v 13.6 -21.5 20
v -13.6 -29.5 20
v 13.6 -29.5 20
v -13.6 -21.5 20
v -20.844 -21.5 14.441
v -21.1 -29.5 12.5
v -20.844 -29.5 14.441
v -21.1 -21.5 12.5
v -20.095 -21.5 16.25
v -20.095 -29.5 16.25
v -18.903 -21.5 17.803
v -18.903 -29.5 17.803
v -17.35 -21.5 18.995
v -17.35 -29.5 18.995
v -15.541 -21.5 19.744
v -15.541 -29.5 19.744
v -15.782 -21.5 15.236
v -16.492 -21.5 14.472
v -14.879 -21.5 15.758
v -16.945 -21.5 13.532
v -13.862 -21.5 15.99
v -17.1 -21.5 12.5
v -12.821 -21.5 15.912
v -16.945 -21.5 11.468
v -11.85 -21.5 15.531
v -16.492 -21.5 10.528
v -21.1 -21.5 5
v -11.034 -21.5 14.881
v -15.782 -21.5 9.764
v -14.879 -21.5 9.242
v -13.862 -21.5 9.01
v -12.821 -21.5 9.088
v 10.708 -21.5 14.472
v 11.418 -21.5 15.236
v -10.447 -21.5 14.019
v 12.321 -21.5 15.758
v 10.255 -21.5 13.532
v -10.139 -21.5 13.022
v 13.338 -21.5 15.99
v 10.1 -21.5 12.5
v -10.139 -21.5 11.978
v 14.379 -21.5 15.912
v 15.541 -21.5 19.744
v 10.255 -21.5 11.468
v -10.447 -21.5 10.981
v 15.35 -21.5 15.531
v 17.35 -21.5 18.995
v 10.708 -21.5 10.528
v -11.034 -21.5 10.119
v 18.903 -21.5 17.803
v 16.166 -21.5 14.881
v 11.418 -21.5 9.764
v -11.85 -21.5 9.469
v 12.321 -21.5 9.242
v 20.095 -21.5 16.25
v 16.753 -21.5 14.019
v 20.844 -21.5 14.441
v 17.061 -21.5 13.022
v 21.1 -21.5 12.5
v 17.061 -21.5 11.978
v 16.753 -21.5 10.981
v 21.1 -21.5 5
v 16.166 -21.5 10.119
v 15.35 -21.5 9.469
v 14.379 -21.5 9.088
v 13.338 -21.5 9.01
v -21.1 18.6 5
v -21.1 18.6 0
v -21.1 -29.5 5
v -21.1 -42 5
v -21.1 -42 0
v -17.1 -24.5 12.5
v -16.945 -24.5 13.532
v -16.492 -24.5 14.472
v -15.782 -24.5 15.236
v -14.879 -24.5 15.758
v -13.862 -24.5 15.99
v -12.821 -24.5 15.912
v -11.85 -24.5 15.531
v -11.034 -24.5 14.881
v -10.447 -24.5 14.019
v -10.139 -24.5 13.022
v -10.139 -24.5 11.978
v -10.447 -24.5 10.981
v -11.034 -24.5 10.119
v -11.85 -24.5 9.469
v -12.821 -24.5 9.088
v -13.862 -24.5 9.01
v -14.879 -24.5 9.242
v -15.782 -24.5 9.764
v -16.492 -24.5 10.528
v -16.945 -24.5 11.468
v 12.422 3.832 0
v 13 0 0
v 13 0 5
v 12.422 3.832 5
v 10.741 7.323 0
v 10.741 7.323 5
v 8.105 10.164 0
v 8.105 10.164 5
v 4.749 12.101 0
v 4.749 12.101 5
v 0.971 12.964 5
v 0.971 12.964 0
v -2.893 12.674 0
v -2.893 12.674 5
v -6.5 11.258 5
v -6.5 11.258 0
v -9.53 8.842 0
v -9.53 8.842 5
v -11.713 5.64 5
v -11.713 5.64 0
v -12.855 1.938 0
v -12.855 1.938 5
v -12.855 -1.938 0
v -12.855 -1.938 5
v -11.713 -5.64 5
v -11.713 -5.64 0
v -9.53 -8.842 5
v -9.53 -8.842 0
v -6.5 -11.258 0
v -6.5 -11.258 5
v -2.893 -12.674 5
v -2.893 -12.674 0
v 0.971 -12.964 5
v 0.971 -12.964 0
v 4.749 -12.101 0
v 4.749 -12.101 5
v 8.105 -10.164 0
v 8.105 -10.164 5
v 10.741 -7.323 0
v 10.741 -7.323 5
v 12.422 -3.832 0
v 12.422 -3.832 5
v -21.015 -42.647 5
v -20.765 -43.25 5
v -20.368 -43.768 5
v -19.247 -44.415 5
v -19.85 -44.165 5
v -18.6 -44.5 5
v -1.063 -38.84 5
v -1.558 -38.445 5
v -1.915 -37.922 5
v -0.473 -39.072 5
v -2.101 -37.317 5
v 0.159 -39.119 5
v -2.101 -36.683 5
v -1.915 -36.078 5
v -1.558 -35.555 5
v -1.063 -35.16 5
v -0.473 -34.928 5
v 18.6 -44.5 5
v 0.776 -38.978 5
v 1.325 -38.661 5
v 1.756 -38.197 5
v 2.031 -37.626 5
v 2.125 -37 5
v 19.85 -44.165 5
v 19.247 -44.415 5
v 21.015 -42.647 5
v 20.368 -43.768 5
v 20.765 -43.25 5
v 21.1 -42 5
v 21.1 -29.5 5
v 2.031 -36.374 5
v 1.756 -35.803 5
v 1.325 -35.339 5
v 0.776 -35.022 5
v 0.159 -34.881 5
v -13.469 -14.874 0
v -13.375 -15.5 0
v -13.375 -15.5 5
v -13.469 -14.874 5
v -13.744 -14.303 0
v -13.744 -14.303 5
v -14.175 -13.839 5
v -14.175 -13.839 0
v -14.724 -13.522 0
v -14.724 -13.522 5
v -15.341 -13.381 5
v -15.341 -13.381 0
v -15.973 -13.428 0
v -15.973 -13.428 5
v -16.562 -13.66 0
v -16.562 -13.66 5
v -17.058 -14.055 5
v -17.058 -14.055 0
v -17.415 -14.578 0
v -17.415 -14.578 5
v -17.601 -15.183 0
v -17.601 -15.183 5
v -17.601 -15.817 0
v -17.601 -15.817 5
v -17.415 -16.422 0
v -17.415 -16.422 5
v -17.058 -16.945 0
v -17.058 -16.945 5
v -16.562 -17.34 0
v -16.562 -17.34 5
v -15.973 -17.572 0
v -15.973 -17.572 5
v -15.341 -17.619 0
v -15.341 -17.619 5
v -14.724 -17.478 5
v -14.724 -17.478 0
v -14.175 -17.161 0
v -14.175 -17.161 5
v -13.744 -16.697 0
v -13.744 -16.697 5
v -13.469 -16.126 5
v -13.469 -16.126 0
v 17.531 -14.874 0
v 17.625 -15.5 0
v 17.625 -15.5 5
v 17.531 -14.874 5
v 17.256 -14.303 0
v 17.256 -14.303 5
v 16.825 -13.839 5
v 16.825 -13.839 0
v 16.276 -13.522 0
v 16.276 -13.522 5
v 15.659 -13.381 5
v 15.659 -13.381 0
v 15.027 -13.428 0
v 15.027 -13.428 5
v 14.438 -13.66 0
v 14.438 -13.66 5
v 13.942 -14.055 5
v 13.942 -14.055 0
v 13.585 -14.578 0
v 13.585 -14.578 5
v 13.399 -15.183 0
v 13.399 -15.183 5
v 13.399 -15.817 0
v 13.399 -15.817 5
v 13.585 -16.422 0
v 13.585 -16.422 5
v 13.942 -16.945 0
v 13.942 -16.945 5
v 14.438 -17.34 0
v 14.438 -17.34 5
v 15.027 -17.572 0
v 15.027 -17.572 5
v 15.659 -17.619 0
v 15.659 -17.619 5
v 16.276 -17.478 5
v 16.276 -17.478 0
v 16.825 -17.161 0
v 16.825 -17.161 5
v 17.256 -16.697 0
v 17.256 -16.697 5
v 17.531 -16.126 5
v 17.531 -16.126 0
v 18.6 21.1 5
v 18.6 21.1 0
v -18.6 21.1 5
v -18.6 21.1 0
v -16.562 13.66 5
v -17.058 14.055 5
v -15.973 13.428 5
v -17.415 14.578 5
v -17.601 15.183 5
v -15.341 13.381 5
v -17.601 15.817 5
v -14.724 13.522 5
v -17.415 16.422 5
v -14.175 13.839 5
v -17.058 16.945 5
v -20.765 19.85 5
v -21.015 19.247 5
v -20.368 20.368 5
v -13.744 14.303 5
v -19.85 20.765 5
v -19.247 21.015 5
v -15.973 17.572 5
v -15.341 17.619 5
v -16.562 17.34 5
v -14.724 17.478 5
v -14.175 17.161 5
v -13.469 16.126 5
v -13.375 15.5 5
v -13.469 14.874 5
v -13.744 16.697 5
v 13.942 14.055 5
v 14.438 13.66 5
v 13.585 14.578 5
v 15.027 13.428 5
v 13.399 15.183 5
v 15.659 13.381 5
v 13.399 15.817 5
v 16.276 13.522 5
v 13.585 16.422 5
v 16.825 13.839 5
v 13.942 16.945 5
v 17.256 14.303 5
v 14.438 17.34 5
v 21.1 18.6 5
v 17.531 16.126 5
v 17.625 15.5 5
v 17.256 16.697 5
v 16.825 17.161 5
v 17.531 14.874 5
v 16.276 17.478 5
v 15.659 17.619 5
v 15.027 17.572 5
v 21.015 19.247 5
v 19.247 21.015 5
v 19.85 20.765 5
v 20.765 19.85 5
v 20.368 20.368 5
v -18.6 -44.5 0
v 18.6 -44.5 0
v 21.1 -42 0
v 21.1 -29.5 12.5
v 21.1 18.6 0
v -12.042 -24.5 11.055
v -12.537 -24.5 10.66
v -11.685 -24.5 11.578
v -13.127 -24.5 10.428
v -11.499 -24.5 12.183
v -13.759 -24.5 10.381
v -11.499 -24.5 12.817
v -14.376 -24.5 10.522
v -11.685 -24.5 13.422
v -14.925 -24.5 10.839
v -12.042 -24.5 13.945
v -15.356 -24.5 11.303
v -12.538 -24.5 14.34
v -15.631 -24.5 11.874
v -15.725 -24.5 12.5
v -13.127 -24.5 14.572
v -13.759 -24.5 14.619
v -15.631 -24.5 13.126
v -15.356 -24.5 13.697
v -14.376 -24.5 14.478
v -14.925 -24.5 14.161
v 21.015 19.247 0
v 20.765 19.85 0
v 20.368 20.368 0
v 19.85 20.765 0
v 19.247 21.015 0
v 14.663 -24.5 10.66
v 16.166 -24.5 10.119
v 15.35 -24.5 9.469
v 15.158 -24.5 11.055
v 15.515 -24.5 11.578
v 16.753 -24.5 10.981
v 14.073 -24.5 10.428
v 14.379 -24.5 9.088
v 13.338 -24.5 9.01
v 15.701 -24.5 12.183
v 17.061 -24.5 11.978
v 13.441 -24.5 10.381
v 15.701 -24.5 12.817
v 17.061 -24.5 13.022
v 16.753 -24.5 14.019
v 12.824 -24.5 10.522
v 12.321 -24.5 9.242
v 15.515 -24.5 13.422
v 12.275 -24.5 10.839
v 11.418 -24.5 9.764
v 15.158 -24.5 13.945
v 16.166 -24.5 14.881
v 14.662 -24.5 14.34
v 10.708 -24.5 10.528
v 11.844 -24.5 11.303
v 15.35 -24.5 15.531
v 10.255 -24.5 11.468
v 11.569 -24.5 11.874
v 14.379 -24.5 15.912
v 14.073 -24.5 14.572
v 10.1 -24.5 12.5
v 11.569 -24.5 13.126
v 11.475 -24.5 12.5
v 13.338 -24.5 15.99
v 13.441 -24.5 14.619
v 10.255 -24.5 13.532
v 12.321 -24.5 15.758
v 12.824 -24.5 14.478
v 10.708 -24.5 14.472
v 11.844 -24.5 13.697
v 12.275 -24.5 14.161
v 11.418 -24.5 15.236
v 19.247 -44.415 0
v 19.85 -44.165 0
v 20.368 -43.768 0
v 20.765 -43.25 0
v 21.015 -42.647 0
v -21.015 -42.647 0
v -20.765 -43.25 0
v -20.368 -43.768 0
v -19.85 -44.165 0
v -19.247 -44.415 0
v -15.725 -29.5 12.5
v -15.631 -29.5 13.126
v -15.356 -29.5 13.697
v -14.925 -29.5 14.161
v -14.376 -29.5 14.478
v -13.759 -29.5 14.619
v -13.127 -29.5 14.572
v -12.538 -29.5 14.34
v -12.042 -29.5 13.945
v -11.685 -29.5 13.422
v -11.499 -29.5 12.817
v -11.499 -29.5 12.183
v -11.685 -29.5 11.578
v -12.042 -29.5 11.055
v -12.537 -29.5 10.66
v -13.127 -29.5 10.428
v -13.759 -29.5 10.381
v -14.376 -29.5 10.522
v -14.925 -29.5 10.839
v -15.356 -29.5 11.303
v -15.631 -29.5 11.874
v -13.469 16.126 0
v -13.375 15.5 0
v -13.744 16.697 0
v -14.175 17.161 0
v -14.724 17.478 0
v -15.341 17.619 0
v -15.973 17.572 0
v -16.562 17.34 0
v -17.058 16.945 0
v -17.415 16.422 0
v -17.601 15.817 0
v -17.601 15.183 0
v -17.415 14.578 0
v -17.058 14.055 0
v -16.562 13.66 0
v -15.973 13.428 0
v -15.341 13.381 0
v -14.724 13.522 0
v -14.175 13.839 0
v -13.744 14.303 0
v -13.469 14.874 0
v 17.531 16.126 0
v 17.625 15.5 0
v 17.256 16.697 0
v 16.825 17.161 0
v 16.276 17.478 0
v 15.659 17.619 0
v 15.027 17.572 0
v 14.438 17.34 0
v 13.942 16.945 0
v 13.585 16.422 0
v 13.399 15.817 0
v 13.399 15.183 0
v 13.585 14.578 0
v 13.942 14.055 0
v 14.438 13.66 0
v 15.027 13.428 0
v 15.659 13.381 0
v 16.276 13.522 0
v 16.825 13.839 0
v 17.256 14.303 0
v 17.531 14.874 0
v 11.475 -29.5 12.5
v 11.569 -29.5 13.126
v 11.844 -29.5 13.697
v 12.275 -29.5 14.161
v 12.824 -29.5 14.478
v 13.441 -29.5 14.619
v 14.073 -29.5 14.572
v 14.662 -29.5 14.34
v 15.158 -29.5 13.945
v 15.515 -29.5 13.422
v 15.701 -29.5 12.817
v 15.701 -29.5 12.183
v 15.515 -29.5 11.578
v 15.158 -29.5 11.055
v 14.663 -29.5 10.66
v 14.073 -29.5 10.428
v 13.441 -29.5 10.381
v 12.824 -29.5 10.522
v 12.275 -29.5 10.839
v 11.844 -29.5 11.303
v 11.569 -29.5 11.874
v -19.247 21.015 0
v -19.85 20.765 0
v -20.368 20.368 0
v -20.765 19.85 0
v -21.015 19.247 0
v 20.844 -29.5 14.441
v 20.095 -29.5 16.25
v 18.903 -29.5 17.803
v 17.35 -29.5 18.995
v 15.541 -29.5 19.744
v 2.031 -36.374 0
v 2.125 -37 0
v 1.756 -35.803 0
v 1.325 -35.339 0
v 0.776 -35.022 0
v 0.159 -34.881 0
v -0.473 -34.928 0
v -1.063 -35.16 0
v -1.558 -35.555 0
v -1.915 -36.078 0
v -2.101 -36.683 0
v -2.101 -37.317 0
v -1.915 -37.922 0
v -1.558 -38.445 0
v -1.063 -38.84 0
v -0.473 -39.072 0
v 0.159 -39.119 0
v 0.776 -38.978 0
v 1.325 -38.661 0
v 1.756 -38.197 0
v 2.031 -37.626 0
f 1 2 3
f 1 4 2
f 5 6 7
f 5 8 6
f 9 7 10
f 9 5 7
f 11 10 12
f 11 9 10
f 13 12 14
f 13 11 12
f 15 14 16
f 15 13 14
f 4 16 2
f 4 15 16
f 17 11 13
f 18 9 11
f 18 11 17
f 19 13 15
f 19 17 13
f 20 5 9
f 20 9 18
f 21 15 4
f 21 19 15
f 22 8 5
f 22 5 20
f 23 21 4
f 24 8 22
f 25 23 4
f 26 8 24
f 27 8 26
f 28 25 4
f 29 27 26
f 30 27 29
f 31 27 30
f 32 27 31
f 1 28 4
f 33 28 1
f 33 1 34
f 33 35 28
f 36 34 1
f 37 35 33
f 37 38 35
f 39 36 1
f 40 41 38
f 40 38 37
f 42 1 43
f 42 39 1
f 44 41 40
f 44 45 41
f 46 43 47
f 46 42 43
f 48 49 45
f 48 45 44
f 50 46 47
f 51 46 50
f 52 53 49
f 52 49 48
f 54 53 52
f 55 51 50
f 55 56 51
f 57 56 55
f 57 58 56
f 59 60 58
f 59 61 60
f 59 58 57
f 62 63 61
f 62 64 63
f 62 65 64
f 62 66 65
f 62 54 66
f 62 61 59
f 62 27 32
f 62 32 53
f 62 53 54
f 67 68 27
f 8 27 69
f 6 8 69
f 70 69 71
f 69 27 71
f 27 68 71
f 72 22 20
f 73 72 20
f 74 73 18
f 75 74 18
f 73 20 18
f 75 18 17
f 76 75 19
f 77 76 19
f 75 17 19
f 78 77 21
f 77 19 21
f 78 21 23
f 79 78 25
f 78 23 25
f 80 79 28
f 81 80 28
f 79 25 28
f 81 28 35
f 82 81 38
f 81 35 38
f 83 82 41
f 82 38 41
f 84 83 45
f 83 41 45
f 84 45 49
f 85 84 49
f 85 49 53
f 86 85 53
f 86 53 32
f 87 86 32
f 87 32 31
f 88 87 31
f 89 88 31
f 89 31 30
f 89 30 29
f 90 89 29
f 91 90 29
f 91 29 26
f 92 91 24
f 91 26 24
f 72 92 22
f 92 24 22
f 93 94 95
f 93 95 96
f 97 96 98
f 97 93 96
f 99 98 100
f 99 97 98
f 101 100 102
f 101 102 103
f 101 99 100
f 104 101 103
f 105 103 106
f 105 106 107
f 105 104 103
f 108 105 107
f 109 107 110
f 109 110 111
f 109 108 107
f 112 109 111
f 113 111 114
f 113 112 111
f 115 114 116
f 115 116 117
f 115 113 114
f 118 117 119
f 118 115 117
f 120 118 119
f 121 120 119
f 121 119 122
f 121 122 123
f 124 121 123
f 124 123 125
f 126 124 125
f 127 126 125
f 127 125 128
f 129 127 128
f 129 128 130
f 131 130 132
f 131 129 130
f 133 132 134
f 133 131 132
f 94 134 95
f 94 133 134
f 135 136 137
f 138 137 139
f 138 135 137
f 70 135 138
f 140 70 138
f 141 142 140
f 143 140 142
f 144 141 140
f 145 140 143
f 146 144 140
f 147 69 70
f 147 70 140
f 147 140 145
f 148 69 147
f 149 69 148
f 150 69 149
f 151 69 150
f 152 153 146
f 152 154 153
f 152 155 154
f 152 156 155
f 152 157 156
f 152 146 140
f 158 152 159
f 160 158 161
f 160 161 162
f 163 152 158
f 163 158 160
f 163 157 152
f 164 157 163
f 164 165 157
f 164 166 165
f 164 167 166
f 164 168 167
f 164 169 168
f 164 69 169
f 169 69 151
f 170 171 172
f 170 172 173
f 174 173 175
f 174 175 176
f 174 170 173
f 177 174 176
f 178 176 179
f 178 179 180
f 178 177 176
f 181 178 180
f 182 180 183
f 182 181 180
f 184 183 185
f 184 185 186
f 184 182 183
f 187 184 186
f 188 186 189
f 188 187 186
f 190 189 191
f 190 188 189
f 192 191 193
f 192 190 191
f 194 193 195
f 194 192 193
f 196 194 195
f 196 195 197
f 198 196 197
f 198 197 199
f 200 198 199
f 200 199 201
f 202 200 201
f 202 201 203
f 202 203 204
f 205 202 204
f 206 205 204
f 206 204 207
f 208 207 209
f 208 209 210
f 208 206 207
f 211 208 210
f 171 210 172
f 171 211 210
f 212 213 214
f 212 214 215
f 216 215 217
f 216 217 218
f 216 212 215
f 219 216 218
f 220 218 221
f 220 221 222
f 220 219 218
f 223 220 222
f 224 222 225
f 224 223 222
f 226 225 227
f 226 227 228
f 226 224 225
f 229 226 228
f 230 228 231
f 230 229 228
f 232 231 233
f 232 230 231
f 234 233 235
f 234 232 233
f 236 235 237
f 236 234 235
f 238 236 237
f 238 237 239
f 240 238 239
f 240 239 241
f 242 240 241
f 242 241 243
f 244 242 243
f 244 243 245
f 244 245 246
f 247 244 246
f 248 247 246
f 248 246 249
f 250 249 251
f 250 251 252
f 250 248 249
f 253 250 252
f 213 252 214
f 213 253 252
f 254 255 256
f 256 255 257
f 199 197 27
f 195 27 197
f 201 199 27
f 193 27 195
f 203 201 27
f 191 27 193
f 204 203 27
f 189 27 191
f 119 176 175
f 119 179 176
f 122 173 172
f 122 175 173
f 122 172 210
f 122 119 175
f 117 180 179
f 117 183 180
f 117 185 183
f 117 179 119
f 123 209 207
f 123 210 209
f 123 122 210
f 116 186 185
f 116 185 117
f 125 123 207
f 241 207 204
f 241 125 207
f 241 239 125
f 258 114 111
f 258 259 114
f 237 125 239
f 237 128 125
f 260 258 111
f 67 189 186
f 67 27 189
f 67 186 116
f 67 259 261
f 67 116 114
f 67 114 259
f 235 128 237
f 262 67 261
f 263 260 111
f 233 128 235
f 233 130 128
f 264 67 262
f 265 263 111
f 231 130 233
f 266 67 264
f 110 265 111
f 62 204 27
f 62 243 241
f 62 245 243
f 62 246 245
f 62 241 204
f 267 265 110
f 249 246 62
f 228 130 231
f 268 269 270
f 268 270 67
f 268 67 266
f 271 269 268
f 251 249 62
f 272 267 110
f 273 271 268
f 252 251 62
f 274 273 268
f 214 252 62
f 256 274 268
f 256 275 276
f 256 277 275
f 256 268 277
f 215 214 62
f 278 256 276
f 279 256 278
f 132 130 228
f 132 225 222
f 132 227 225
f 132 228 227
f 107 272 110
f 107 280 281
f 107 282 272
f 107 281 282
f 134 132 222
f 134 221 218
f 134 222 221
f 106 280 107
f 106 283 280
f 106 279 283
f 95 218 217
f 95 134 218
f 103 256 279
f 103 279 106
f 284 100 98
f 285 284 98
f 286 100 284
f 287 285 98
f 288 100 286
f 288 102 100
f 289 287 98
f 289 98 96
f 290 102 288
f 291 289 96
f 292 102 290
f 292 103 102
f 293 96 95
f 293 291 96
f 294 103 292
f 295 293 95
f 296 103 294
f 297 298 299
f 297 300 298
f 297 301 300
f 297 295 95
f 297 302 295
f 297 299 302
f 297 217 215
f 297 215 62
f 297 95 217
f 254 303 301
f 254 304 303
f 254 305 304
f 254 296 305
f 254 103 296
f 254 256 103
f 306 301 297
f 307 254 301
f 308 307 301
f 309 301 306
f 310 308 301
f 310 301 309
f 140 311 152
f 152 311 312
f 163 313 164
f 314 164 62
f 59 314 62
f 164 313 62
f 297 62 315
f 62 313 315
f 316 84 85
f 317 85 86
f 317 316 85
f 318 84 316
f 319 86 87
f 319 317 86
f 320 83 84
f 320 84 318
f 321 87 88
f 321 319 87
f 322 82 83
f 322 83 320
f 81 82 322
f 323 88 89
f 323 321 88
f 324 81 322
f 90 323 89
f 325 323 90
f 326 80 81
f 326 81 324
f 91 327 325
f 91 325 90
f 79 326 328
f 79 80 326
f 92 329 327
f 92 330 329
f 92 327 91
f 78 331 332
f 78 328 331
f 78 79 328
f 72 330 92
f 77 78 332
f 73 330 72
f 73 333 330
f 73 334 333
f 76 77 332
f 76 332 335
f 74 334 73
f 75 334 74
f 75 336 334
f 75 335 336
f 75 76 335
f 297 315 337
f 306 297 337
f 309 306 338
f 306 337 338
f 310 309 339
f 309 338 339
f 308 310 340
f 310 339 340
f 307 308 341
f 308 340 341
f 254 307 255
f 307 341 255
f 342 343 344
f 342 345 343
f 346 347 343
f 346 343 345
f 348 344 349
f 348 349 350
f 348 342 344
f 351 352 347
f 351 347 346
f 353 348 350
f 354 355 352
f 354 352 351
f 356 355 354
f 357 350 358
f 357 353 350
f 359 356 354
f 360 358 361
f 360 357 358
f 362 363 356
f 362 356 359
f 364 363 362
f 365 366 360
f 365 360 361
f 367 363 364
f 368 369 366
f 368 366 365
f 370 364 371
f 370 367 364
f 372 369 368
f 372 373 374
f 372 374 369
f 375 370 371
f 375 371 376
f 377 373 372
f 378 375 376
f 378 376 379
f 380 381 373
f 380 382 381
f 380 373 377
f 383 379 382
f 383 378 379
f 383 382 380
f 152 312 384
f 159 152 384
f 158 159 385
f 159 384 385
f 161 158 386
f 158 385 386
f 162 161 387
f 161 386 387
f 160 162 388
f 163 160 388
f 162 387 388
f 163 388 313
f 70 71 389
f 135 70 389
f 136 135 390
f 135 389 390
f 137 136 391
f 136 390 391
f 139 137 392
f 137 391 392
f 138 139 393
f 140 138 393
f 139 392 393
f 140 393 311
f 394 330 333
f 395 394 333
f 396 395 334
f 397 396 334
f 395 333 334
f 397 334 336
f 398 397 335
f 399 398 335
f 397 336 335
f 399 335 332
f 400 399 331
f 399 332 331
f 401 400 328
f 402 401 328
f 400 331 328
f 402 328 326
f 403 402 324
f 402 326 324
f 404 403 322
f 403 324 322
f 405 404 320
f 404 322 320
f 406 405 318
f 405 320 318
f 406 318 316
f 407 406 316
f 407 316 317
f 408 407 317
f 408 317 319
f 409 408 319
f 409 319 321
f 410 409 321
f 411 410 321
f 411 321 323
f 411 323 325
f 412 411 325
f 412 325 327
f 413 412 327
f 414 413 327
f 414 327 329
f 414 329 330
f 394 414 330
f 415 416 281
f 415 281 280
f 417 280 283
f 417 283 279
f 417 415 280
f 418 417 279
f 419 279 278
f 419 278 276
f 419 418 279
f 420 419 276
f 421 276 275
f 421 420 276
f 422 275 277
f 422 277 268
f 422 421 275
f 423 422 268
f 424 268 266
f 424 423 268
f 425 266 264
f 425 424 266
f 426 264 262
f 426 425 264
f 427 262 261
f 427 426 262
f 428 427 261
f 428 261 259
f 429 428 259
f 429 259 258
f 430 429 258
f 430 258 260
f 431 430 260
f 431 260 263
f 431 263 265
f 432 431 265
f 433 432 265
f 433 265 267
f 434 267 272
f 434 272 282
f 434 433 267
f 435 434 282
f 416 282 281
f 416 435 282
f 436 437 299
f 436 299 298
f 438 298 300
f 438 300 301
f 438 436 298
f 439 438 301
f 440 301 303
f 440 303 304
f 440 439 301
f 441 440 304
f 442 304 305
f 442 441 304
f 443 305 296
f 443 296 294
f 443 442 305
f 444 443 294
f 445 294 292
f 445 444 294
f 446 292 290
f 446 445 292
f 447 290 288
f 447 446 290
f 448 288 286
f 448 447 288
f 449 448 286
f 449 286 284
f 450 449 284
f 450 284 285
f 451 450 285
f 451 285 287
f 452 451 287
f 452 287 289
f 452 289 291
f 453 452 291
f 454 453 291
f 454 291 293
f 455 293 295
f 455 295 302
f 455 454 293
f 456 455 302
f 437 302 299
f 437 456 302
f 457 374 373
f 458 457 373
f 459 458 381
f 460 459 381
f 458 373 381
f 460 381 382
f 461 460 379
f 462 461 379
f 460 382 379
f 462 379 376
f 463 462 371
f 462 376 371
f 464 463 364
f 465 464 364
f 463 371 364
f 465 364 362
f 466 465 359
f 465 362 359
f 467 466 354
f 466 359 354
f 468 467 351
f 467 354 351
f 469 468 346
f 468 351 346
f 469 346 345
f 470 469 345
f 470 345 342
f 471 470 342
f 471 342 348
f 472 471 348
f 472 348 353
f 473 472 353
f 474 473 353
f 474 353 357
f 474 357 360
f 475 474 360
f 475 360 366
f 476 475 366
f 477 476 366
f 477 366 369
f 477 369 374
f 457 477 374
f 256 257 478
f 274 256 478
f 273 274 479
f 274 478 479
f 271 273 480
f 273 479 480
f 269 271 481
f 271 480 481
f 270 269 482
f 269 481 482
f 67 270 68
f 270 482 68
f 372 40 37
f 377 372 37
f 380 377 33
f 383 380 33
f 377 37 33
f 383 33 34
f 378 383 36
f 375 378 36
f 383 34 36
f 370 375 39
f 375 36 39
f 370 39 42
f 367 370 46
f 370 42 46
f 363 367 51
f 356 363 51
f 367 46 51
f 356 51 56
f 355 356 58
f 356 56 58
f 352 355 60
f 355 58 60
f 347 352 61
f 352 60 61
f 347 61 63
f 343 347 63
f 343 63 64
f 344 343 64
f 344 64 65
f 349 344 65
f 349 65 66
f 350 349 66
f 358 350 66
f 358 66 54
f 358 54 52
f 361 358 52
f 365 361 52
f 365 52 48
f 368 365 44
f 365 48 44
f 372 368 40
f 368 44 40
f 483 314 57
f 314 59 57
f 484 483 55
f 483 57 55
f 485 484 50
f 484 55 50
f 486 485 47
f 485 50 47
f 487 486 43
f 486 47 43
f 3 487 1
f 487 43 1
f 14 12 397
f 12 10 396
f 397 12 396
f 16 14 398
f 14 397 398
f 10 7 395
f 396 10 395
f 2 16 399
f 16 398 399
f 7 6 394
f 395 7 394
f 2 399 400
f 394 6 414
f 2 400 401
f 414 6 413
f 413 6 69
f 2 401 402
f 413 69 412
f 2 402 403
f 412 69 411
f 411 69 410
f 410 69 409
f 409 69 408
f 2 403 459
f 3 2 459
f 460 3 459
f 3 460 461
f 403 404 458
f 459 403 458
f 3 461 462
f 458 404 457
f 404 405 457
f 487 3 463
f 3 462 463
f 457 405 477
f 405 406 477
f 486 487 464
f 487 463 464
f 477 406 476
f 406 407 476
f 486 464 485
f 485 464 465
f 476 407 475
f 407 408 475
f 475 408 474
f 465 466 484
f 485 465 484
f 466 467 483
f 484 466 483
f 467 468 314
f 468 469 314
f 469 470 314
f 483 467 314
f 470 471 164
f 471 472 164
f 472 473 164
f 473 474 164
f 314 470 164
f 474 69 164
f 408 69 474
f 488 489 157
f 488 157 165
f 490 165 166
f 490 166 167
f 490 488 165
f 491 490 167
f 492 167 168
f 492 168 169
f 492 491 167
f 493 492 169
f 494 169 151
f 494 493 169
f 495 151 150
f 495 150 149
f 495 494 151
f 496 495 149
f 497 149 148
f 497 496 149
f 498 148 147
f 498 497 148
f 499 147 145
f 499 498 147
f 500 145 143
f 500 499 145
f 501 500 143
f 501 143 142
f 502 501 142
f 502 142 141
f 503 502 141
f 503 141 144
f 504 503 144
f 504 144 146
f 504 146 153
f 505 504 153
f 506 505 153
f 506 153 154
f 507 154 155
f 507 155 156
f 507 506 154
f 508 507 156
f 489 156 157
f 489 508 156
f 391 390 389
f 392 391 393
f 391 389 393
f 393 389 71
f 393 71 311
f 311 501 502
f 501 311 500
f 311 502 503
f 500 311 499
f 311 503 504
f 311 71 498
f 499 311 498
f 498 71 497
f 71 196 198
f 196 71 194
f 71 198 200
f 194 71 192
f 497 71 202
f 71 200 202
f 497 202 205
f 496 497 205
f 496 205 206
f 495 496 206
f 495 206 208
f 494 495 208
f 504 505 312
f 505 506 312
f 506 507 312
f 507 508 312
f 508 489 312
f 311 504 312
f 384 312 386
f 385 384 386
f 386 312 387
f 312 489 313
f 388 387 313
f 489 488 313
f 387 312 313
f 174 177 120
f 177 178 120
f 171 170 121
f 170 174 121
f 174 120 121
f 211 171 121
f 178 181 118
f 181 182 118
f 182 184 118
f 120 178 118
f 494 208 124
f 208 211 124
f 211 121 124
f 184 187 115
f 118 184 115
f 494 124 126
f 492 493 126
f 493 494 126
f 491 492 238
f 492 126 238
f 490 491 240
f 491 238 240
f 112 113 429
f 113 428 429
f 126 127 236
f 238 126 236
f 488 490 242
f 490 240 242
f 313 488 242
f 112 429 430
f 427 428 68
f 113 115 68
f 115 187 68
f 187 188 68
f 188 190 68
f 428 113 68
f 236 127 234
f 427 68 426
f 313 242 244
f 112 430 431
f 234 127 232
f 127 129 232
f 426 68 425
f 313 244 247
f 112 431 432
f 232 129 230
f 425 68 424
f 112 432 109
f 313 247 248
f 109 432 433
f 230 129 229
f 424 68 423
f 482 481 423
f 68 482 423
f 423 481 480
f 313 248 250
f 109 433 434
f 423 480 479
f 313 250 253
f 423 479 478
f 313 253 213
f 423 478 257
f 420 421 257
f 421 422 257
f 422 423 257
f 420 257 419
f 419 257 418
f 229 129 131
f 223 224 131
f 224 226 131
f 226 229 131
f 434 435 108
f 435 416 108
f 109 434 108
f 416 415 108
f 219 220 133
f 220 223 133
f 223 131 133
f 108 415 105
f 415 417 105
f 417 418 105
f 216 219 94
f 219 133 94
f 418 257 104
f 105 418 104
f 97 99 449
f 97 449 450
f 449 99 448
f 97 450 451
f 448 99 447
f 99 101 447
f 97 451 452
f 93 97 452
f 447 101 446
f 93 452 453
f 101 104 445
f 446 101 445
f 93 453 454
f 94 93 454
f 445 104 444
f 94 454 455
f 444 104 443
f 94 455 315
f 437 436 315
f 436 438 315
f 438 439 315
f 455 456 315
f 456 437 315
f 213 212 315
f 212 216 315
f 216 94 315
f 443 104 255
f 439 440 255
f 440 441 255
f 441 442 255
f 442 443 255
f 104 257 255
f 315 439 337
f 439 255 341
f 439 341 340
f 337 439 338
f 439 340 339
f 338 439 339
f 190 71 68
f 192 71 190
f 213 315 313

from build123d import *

# Parameters (mm, degrees)
F0_R     = 2.125
F0_R_2   = 13
F1_DEPTH = 5
F2_W     = 42.2
F2_H     = 8
F3_DEPTH = 15
F4_R     = 7.5
F5_R     = 2.125
F6_DEPTH = 23.001
F7_R     = 3.5
F8_DEPTH = 3


with BuildPart() as f1:
    # F0 (on Top) → F1 (new body)
    with BuildSketch(Plane.XY):
        with BuildLine():
            Line((18.6, 21.1), (-18.6, 21.1))
            ThreePointArc((-18.6, 21.1), (-20.367767, 20.367767), (-21.1, 18.6))
            Line((-21.1, 18.6), (-21.1, -42))
            ThreePointArc((-21.1, -42), (-20.367767, -43.767767), (-18.6, -44.5))
            Line((-18.6, -44.5), (18.6, -44.5))
            ThreePointArc((18.6, -44.5), (20.367767, -43.767767), (21.1, -42))
            Line((21.1, -42), (21.1, 18.6))
            ThreePointArc((21.1, 18.6), (20.367767, 20.367767), (18.6, 21.1))
        make_face()
        with Locations((-15.5, -15.5)):
            Circle(F0_R, mode=Mode.SUBTRACT)
        with Locations((0, -37)):
            Circle(F0_R, mode=Mode.SUBTRACT)
        with Locations((15.5, -15.5)):
            Circle(F0_R, mode=Mode.SUBTRACT)
        with Locations((-15.5, 15.5)):
            Circle(F0_R, mode=Mode.SUBTRACT)
        Circle(F0_R_2, mode=Mode.SUBTRACT)
        with Locations((15.5, 15.5)):
            Circle(F0_R, mode=Mode.SUBTRACT)
    extrude(amount=F1_DEPTH)

    # F2 (on face) → F3 (join)
    with BuildSketch(Plane.XY.offset(5)):
        with Locations((0, -25.5)):
            Rectangle(F2_W, F2_H)
    extrude(amount=F3_DEPTH)

    # F4
    f4_edges = [f1.edges().sort_by_distance(p)[0] for p in [
        (-21.1, -25.5, 20),
        (21.1, -25.5, 20),
    ]]
    fillet(f4_edges, radius=F4_R)

    # F5 (on face) → F6 (cut, through all)
    with BuildSketch(Plane(origin=(0, -21.5, 0), x_dir=(-1, 0, 0), z_dir=(0, 1, 0))):
        with Locations((-13.6, 12.5)):
            Circle(F5_R)
        with Locations((13.6, 12.5)):
            Circle(F5_R)
    extrude(amount=-F6_DEPTH, mode=Mode.SUBTRACT)

    # F7 (on face) → F8 (cut)
    with BuildSketch(Plane(origin=(0, -21.5, 0), x_dir=(-1, 0, 0), z_dir=(0, 1, 0))):
        with Locations((-13.6, 12.5)):
            Circle(F7_R)
        with Locations((13.6, 12.5)):
            Circle(F7_R)
    extrude(amount=-F8_DEPTH, mode=Mode.SUBTRACT)


solid = f1.part
